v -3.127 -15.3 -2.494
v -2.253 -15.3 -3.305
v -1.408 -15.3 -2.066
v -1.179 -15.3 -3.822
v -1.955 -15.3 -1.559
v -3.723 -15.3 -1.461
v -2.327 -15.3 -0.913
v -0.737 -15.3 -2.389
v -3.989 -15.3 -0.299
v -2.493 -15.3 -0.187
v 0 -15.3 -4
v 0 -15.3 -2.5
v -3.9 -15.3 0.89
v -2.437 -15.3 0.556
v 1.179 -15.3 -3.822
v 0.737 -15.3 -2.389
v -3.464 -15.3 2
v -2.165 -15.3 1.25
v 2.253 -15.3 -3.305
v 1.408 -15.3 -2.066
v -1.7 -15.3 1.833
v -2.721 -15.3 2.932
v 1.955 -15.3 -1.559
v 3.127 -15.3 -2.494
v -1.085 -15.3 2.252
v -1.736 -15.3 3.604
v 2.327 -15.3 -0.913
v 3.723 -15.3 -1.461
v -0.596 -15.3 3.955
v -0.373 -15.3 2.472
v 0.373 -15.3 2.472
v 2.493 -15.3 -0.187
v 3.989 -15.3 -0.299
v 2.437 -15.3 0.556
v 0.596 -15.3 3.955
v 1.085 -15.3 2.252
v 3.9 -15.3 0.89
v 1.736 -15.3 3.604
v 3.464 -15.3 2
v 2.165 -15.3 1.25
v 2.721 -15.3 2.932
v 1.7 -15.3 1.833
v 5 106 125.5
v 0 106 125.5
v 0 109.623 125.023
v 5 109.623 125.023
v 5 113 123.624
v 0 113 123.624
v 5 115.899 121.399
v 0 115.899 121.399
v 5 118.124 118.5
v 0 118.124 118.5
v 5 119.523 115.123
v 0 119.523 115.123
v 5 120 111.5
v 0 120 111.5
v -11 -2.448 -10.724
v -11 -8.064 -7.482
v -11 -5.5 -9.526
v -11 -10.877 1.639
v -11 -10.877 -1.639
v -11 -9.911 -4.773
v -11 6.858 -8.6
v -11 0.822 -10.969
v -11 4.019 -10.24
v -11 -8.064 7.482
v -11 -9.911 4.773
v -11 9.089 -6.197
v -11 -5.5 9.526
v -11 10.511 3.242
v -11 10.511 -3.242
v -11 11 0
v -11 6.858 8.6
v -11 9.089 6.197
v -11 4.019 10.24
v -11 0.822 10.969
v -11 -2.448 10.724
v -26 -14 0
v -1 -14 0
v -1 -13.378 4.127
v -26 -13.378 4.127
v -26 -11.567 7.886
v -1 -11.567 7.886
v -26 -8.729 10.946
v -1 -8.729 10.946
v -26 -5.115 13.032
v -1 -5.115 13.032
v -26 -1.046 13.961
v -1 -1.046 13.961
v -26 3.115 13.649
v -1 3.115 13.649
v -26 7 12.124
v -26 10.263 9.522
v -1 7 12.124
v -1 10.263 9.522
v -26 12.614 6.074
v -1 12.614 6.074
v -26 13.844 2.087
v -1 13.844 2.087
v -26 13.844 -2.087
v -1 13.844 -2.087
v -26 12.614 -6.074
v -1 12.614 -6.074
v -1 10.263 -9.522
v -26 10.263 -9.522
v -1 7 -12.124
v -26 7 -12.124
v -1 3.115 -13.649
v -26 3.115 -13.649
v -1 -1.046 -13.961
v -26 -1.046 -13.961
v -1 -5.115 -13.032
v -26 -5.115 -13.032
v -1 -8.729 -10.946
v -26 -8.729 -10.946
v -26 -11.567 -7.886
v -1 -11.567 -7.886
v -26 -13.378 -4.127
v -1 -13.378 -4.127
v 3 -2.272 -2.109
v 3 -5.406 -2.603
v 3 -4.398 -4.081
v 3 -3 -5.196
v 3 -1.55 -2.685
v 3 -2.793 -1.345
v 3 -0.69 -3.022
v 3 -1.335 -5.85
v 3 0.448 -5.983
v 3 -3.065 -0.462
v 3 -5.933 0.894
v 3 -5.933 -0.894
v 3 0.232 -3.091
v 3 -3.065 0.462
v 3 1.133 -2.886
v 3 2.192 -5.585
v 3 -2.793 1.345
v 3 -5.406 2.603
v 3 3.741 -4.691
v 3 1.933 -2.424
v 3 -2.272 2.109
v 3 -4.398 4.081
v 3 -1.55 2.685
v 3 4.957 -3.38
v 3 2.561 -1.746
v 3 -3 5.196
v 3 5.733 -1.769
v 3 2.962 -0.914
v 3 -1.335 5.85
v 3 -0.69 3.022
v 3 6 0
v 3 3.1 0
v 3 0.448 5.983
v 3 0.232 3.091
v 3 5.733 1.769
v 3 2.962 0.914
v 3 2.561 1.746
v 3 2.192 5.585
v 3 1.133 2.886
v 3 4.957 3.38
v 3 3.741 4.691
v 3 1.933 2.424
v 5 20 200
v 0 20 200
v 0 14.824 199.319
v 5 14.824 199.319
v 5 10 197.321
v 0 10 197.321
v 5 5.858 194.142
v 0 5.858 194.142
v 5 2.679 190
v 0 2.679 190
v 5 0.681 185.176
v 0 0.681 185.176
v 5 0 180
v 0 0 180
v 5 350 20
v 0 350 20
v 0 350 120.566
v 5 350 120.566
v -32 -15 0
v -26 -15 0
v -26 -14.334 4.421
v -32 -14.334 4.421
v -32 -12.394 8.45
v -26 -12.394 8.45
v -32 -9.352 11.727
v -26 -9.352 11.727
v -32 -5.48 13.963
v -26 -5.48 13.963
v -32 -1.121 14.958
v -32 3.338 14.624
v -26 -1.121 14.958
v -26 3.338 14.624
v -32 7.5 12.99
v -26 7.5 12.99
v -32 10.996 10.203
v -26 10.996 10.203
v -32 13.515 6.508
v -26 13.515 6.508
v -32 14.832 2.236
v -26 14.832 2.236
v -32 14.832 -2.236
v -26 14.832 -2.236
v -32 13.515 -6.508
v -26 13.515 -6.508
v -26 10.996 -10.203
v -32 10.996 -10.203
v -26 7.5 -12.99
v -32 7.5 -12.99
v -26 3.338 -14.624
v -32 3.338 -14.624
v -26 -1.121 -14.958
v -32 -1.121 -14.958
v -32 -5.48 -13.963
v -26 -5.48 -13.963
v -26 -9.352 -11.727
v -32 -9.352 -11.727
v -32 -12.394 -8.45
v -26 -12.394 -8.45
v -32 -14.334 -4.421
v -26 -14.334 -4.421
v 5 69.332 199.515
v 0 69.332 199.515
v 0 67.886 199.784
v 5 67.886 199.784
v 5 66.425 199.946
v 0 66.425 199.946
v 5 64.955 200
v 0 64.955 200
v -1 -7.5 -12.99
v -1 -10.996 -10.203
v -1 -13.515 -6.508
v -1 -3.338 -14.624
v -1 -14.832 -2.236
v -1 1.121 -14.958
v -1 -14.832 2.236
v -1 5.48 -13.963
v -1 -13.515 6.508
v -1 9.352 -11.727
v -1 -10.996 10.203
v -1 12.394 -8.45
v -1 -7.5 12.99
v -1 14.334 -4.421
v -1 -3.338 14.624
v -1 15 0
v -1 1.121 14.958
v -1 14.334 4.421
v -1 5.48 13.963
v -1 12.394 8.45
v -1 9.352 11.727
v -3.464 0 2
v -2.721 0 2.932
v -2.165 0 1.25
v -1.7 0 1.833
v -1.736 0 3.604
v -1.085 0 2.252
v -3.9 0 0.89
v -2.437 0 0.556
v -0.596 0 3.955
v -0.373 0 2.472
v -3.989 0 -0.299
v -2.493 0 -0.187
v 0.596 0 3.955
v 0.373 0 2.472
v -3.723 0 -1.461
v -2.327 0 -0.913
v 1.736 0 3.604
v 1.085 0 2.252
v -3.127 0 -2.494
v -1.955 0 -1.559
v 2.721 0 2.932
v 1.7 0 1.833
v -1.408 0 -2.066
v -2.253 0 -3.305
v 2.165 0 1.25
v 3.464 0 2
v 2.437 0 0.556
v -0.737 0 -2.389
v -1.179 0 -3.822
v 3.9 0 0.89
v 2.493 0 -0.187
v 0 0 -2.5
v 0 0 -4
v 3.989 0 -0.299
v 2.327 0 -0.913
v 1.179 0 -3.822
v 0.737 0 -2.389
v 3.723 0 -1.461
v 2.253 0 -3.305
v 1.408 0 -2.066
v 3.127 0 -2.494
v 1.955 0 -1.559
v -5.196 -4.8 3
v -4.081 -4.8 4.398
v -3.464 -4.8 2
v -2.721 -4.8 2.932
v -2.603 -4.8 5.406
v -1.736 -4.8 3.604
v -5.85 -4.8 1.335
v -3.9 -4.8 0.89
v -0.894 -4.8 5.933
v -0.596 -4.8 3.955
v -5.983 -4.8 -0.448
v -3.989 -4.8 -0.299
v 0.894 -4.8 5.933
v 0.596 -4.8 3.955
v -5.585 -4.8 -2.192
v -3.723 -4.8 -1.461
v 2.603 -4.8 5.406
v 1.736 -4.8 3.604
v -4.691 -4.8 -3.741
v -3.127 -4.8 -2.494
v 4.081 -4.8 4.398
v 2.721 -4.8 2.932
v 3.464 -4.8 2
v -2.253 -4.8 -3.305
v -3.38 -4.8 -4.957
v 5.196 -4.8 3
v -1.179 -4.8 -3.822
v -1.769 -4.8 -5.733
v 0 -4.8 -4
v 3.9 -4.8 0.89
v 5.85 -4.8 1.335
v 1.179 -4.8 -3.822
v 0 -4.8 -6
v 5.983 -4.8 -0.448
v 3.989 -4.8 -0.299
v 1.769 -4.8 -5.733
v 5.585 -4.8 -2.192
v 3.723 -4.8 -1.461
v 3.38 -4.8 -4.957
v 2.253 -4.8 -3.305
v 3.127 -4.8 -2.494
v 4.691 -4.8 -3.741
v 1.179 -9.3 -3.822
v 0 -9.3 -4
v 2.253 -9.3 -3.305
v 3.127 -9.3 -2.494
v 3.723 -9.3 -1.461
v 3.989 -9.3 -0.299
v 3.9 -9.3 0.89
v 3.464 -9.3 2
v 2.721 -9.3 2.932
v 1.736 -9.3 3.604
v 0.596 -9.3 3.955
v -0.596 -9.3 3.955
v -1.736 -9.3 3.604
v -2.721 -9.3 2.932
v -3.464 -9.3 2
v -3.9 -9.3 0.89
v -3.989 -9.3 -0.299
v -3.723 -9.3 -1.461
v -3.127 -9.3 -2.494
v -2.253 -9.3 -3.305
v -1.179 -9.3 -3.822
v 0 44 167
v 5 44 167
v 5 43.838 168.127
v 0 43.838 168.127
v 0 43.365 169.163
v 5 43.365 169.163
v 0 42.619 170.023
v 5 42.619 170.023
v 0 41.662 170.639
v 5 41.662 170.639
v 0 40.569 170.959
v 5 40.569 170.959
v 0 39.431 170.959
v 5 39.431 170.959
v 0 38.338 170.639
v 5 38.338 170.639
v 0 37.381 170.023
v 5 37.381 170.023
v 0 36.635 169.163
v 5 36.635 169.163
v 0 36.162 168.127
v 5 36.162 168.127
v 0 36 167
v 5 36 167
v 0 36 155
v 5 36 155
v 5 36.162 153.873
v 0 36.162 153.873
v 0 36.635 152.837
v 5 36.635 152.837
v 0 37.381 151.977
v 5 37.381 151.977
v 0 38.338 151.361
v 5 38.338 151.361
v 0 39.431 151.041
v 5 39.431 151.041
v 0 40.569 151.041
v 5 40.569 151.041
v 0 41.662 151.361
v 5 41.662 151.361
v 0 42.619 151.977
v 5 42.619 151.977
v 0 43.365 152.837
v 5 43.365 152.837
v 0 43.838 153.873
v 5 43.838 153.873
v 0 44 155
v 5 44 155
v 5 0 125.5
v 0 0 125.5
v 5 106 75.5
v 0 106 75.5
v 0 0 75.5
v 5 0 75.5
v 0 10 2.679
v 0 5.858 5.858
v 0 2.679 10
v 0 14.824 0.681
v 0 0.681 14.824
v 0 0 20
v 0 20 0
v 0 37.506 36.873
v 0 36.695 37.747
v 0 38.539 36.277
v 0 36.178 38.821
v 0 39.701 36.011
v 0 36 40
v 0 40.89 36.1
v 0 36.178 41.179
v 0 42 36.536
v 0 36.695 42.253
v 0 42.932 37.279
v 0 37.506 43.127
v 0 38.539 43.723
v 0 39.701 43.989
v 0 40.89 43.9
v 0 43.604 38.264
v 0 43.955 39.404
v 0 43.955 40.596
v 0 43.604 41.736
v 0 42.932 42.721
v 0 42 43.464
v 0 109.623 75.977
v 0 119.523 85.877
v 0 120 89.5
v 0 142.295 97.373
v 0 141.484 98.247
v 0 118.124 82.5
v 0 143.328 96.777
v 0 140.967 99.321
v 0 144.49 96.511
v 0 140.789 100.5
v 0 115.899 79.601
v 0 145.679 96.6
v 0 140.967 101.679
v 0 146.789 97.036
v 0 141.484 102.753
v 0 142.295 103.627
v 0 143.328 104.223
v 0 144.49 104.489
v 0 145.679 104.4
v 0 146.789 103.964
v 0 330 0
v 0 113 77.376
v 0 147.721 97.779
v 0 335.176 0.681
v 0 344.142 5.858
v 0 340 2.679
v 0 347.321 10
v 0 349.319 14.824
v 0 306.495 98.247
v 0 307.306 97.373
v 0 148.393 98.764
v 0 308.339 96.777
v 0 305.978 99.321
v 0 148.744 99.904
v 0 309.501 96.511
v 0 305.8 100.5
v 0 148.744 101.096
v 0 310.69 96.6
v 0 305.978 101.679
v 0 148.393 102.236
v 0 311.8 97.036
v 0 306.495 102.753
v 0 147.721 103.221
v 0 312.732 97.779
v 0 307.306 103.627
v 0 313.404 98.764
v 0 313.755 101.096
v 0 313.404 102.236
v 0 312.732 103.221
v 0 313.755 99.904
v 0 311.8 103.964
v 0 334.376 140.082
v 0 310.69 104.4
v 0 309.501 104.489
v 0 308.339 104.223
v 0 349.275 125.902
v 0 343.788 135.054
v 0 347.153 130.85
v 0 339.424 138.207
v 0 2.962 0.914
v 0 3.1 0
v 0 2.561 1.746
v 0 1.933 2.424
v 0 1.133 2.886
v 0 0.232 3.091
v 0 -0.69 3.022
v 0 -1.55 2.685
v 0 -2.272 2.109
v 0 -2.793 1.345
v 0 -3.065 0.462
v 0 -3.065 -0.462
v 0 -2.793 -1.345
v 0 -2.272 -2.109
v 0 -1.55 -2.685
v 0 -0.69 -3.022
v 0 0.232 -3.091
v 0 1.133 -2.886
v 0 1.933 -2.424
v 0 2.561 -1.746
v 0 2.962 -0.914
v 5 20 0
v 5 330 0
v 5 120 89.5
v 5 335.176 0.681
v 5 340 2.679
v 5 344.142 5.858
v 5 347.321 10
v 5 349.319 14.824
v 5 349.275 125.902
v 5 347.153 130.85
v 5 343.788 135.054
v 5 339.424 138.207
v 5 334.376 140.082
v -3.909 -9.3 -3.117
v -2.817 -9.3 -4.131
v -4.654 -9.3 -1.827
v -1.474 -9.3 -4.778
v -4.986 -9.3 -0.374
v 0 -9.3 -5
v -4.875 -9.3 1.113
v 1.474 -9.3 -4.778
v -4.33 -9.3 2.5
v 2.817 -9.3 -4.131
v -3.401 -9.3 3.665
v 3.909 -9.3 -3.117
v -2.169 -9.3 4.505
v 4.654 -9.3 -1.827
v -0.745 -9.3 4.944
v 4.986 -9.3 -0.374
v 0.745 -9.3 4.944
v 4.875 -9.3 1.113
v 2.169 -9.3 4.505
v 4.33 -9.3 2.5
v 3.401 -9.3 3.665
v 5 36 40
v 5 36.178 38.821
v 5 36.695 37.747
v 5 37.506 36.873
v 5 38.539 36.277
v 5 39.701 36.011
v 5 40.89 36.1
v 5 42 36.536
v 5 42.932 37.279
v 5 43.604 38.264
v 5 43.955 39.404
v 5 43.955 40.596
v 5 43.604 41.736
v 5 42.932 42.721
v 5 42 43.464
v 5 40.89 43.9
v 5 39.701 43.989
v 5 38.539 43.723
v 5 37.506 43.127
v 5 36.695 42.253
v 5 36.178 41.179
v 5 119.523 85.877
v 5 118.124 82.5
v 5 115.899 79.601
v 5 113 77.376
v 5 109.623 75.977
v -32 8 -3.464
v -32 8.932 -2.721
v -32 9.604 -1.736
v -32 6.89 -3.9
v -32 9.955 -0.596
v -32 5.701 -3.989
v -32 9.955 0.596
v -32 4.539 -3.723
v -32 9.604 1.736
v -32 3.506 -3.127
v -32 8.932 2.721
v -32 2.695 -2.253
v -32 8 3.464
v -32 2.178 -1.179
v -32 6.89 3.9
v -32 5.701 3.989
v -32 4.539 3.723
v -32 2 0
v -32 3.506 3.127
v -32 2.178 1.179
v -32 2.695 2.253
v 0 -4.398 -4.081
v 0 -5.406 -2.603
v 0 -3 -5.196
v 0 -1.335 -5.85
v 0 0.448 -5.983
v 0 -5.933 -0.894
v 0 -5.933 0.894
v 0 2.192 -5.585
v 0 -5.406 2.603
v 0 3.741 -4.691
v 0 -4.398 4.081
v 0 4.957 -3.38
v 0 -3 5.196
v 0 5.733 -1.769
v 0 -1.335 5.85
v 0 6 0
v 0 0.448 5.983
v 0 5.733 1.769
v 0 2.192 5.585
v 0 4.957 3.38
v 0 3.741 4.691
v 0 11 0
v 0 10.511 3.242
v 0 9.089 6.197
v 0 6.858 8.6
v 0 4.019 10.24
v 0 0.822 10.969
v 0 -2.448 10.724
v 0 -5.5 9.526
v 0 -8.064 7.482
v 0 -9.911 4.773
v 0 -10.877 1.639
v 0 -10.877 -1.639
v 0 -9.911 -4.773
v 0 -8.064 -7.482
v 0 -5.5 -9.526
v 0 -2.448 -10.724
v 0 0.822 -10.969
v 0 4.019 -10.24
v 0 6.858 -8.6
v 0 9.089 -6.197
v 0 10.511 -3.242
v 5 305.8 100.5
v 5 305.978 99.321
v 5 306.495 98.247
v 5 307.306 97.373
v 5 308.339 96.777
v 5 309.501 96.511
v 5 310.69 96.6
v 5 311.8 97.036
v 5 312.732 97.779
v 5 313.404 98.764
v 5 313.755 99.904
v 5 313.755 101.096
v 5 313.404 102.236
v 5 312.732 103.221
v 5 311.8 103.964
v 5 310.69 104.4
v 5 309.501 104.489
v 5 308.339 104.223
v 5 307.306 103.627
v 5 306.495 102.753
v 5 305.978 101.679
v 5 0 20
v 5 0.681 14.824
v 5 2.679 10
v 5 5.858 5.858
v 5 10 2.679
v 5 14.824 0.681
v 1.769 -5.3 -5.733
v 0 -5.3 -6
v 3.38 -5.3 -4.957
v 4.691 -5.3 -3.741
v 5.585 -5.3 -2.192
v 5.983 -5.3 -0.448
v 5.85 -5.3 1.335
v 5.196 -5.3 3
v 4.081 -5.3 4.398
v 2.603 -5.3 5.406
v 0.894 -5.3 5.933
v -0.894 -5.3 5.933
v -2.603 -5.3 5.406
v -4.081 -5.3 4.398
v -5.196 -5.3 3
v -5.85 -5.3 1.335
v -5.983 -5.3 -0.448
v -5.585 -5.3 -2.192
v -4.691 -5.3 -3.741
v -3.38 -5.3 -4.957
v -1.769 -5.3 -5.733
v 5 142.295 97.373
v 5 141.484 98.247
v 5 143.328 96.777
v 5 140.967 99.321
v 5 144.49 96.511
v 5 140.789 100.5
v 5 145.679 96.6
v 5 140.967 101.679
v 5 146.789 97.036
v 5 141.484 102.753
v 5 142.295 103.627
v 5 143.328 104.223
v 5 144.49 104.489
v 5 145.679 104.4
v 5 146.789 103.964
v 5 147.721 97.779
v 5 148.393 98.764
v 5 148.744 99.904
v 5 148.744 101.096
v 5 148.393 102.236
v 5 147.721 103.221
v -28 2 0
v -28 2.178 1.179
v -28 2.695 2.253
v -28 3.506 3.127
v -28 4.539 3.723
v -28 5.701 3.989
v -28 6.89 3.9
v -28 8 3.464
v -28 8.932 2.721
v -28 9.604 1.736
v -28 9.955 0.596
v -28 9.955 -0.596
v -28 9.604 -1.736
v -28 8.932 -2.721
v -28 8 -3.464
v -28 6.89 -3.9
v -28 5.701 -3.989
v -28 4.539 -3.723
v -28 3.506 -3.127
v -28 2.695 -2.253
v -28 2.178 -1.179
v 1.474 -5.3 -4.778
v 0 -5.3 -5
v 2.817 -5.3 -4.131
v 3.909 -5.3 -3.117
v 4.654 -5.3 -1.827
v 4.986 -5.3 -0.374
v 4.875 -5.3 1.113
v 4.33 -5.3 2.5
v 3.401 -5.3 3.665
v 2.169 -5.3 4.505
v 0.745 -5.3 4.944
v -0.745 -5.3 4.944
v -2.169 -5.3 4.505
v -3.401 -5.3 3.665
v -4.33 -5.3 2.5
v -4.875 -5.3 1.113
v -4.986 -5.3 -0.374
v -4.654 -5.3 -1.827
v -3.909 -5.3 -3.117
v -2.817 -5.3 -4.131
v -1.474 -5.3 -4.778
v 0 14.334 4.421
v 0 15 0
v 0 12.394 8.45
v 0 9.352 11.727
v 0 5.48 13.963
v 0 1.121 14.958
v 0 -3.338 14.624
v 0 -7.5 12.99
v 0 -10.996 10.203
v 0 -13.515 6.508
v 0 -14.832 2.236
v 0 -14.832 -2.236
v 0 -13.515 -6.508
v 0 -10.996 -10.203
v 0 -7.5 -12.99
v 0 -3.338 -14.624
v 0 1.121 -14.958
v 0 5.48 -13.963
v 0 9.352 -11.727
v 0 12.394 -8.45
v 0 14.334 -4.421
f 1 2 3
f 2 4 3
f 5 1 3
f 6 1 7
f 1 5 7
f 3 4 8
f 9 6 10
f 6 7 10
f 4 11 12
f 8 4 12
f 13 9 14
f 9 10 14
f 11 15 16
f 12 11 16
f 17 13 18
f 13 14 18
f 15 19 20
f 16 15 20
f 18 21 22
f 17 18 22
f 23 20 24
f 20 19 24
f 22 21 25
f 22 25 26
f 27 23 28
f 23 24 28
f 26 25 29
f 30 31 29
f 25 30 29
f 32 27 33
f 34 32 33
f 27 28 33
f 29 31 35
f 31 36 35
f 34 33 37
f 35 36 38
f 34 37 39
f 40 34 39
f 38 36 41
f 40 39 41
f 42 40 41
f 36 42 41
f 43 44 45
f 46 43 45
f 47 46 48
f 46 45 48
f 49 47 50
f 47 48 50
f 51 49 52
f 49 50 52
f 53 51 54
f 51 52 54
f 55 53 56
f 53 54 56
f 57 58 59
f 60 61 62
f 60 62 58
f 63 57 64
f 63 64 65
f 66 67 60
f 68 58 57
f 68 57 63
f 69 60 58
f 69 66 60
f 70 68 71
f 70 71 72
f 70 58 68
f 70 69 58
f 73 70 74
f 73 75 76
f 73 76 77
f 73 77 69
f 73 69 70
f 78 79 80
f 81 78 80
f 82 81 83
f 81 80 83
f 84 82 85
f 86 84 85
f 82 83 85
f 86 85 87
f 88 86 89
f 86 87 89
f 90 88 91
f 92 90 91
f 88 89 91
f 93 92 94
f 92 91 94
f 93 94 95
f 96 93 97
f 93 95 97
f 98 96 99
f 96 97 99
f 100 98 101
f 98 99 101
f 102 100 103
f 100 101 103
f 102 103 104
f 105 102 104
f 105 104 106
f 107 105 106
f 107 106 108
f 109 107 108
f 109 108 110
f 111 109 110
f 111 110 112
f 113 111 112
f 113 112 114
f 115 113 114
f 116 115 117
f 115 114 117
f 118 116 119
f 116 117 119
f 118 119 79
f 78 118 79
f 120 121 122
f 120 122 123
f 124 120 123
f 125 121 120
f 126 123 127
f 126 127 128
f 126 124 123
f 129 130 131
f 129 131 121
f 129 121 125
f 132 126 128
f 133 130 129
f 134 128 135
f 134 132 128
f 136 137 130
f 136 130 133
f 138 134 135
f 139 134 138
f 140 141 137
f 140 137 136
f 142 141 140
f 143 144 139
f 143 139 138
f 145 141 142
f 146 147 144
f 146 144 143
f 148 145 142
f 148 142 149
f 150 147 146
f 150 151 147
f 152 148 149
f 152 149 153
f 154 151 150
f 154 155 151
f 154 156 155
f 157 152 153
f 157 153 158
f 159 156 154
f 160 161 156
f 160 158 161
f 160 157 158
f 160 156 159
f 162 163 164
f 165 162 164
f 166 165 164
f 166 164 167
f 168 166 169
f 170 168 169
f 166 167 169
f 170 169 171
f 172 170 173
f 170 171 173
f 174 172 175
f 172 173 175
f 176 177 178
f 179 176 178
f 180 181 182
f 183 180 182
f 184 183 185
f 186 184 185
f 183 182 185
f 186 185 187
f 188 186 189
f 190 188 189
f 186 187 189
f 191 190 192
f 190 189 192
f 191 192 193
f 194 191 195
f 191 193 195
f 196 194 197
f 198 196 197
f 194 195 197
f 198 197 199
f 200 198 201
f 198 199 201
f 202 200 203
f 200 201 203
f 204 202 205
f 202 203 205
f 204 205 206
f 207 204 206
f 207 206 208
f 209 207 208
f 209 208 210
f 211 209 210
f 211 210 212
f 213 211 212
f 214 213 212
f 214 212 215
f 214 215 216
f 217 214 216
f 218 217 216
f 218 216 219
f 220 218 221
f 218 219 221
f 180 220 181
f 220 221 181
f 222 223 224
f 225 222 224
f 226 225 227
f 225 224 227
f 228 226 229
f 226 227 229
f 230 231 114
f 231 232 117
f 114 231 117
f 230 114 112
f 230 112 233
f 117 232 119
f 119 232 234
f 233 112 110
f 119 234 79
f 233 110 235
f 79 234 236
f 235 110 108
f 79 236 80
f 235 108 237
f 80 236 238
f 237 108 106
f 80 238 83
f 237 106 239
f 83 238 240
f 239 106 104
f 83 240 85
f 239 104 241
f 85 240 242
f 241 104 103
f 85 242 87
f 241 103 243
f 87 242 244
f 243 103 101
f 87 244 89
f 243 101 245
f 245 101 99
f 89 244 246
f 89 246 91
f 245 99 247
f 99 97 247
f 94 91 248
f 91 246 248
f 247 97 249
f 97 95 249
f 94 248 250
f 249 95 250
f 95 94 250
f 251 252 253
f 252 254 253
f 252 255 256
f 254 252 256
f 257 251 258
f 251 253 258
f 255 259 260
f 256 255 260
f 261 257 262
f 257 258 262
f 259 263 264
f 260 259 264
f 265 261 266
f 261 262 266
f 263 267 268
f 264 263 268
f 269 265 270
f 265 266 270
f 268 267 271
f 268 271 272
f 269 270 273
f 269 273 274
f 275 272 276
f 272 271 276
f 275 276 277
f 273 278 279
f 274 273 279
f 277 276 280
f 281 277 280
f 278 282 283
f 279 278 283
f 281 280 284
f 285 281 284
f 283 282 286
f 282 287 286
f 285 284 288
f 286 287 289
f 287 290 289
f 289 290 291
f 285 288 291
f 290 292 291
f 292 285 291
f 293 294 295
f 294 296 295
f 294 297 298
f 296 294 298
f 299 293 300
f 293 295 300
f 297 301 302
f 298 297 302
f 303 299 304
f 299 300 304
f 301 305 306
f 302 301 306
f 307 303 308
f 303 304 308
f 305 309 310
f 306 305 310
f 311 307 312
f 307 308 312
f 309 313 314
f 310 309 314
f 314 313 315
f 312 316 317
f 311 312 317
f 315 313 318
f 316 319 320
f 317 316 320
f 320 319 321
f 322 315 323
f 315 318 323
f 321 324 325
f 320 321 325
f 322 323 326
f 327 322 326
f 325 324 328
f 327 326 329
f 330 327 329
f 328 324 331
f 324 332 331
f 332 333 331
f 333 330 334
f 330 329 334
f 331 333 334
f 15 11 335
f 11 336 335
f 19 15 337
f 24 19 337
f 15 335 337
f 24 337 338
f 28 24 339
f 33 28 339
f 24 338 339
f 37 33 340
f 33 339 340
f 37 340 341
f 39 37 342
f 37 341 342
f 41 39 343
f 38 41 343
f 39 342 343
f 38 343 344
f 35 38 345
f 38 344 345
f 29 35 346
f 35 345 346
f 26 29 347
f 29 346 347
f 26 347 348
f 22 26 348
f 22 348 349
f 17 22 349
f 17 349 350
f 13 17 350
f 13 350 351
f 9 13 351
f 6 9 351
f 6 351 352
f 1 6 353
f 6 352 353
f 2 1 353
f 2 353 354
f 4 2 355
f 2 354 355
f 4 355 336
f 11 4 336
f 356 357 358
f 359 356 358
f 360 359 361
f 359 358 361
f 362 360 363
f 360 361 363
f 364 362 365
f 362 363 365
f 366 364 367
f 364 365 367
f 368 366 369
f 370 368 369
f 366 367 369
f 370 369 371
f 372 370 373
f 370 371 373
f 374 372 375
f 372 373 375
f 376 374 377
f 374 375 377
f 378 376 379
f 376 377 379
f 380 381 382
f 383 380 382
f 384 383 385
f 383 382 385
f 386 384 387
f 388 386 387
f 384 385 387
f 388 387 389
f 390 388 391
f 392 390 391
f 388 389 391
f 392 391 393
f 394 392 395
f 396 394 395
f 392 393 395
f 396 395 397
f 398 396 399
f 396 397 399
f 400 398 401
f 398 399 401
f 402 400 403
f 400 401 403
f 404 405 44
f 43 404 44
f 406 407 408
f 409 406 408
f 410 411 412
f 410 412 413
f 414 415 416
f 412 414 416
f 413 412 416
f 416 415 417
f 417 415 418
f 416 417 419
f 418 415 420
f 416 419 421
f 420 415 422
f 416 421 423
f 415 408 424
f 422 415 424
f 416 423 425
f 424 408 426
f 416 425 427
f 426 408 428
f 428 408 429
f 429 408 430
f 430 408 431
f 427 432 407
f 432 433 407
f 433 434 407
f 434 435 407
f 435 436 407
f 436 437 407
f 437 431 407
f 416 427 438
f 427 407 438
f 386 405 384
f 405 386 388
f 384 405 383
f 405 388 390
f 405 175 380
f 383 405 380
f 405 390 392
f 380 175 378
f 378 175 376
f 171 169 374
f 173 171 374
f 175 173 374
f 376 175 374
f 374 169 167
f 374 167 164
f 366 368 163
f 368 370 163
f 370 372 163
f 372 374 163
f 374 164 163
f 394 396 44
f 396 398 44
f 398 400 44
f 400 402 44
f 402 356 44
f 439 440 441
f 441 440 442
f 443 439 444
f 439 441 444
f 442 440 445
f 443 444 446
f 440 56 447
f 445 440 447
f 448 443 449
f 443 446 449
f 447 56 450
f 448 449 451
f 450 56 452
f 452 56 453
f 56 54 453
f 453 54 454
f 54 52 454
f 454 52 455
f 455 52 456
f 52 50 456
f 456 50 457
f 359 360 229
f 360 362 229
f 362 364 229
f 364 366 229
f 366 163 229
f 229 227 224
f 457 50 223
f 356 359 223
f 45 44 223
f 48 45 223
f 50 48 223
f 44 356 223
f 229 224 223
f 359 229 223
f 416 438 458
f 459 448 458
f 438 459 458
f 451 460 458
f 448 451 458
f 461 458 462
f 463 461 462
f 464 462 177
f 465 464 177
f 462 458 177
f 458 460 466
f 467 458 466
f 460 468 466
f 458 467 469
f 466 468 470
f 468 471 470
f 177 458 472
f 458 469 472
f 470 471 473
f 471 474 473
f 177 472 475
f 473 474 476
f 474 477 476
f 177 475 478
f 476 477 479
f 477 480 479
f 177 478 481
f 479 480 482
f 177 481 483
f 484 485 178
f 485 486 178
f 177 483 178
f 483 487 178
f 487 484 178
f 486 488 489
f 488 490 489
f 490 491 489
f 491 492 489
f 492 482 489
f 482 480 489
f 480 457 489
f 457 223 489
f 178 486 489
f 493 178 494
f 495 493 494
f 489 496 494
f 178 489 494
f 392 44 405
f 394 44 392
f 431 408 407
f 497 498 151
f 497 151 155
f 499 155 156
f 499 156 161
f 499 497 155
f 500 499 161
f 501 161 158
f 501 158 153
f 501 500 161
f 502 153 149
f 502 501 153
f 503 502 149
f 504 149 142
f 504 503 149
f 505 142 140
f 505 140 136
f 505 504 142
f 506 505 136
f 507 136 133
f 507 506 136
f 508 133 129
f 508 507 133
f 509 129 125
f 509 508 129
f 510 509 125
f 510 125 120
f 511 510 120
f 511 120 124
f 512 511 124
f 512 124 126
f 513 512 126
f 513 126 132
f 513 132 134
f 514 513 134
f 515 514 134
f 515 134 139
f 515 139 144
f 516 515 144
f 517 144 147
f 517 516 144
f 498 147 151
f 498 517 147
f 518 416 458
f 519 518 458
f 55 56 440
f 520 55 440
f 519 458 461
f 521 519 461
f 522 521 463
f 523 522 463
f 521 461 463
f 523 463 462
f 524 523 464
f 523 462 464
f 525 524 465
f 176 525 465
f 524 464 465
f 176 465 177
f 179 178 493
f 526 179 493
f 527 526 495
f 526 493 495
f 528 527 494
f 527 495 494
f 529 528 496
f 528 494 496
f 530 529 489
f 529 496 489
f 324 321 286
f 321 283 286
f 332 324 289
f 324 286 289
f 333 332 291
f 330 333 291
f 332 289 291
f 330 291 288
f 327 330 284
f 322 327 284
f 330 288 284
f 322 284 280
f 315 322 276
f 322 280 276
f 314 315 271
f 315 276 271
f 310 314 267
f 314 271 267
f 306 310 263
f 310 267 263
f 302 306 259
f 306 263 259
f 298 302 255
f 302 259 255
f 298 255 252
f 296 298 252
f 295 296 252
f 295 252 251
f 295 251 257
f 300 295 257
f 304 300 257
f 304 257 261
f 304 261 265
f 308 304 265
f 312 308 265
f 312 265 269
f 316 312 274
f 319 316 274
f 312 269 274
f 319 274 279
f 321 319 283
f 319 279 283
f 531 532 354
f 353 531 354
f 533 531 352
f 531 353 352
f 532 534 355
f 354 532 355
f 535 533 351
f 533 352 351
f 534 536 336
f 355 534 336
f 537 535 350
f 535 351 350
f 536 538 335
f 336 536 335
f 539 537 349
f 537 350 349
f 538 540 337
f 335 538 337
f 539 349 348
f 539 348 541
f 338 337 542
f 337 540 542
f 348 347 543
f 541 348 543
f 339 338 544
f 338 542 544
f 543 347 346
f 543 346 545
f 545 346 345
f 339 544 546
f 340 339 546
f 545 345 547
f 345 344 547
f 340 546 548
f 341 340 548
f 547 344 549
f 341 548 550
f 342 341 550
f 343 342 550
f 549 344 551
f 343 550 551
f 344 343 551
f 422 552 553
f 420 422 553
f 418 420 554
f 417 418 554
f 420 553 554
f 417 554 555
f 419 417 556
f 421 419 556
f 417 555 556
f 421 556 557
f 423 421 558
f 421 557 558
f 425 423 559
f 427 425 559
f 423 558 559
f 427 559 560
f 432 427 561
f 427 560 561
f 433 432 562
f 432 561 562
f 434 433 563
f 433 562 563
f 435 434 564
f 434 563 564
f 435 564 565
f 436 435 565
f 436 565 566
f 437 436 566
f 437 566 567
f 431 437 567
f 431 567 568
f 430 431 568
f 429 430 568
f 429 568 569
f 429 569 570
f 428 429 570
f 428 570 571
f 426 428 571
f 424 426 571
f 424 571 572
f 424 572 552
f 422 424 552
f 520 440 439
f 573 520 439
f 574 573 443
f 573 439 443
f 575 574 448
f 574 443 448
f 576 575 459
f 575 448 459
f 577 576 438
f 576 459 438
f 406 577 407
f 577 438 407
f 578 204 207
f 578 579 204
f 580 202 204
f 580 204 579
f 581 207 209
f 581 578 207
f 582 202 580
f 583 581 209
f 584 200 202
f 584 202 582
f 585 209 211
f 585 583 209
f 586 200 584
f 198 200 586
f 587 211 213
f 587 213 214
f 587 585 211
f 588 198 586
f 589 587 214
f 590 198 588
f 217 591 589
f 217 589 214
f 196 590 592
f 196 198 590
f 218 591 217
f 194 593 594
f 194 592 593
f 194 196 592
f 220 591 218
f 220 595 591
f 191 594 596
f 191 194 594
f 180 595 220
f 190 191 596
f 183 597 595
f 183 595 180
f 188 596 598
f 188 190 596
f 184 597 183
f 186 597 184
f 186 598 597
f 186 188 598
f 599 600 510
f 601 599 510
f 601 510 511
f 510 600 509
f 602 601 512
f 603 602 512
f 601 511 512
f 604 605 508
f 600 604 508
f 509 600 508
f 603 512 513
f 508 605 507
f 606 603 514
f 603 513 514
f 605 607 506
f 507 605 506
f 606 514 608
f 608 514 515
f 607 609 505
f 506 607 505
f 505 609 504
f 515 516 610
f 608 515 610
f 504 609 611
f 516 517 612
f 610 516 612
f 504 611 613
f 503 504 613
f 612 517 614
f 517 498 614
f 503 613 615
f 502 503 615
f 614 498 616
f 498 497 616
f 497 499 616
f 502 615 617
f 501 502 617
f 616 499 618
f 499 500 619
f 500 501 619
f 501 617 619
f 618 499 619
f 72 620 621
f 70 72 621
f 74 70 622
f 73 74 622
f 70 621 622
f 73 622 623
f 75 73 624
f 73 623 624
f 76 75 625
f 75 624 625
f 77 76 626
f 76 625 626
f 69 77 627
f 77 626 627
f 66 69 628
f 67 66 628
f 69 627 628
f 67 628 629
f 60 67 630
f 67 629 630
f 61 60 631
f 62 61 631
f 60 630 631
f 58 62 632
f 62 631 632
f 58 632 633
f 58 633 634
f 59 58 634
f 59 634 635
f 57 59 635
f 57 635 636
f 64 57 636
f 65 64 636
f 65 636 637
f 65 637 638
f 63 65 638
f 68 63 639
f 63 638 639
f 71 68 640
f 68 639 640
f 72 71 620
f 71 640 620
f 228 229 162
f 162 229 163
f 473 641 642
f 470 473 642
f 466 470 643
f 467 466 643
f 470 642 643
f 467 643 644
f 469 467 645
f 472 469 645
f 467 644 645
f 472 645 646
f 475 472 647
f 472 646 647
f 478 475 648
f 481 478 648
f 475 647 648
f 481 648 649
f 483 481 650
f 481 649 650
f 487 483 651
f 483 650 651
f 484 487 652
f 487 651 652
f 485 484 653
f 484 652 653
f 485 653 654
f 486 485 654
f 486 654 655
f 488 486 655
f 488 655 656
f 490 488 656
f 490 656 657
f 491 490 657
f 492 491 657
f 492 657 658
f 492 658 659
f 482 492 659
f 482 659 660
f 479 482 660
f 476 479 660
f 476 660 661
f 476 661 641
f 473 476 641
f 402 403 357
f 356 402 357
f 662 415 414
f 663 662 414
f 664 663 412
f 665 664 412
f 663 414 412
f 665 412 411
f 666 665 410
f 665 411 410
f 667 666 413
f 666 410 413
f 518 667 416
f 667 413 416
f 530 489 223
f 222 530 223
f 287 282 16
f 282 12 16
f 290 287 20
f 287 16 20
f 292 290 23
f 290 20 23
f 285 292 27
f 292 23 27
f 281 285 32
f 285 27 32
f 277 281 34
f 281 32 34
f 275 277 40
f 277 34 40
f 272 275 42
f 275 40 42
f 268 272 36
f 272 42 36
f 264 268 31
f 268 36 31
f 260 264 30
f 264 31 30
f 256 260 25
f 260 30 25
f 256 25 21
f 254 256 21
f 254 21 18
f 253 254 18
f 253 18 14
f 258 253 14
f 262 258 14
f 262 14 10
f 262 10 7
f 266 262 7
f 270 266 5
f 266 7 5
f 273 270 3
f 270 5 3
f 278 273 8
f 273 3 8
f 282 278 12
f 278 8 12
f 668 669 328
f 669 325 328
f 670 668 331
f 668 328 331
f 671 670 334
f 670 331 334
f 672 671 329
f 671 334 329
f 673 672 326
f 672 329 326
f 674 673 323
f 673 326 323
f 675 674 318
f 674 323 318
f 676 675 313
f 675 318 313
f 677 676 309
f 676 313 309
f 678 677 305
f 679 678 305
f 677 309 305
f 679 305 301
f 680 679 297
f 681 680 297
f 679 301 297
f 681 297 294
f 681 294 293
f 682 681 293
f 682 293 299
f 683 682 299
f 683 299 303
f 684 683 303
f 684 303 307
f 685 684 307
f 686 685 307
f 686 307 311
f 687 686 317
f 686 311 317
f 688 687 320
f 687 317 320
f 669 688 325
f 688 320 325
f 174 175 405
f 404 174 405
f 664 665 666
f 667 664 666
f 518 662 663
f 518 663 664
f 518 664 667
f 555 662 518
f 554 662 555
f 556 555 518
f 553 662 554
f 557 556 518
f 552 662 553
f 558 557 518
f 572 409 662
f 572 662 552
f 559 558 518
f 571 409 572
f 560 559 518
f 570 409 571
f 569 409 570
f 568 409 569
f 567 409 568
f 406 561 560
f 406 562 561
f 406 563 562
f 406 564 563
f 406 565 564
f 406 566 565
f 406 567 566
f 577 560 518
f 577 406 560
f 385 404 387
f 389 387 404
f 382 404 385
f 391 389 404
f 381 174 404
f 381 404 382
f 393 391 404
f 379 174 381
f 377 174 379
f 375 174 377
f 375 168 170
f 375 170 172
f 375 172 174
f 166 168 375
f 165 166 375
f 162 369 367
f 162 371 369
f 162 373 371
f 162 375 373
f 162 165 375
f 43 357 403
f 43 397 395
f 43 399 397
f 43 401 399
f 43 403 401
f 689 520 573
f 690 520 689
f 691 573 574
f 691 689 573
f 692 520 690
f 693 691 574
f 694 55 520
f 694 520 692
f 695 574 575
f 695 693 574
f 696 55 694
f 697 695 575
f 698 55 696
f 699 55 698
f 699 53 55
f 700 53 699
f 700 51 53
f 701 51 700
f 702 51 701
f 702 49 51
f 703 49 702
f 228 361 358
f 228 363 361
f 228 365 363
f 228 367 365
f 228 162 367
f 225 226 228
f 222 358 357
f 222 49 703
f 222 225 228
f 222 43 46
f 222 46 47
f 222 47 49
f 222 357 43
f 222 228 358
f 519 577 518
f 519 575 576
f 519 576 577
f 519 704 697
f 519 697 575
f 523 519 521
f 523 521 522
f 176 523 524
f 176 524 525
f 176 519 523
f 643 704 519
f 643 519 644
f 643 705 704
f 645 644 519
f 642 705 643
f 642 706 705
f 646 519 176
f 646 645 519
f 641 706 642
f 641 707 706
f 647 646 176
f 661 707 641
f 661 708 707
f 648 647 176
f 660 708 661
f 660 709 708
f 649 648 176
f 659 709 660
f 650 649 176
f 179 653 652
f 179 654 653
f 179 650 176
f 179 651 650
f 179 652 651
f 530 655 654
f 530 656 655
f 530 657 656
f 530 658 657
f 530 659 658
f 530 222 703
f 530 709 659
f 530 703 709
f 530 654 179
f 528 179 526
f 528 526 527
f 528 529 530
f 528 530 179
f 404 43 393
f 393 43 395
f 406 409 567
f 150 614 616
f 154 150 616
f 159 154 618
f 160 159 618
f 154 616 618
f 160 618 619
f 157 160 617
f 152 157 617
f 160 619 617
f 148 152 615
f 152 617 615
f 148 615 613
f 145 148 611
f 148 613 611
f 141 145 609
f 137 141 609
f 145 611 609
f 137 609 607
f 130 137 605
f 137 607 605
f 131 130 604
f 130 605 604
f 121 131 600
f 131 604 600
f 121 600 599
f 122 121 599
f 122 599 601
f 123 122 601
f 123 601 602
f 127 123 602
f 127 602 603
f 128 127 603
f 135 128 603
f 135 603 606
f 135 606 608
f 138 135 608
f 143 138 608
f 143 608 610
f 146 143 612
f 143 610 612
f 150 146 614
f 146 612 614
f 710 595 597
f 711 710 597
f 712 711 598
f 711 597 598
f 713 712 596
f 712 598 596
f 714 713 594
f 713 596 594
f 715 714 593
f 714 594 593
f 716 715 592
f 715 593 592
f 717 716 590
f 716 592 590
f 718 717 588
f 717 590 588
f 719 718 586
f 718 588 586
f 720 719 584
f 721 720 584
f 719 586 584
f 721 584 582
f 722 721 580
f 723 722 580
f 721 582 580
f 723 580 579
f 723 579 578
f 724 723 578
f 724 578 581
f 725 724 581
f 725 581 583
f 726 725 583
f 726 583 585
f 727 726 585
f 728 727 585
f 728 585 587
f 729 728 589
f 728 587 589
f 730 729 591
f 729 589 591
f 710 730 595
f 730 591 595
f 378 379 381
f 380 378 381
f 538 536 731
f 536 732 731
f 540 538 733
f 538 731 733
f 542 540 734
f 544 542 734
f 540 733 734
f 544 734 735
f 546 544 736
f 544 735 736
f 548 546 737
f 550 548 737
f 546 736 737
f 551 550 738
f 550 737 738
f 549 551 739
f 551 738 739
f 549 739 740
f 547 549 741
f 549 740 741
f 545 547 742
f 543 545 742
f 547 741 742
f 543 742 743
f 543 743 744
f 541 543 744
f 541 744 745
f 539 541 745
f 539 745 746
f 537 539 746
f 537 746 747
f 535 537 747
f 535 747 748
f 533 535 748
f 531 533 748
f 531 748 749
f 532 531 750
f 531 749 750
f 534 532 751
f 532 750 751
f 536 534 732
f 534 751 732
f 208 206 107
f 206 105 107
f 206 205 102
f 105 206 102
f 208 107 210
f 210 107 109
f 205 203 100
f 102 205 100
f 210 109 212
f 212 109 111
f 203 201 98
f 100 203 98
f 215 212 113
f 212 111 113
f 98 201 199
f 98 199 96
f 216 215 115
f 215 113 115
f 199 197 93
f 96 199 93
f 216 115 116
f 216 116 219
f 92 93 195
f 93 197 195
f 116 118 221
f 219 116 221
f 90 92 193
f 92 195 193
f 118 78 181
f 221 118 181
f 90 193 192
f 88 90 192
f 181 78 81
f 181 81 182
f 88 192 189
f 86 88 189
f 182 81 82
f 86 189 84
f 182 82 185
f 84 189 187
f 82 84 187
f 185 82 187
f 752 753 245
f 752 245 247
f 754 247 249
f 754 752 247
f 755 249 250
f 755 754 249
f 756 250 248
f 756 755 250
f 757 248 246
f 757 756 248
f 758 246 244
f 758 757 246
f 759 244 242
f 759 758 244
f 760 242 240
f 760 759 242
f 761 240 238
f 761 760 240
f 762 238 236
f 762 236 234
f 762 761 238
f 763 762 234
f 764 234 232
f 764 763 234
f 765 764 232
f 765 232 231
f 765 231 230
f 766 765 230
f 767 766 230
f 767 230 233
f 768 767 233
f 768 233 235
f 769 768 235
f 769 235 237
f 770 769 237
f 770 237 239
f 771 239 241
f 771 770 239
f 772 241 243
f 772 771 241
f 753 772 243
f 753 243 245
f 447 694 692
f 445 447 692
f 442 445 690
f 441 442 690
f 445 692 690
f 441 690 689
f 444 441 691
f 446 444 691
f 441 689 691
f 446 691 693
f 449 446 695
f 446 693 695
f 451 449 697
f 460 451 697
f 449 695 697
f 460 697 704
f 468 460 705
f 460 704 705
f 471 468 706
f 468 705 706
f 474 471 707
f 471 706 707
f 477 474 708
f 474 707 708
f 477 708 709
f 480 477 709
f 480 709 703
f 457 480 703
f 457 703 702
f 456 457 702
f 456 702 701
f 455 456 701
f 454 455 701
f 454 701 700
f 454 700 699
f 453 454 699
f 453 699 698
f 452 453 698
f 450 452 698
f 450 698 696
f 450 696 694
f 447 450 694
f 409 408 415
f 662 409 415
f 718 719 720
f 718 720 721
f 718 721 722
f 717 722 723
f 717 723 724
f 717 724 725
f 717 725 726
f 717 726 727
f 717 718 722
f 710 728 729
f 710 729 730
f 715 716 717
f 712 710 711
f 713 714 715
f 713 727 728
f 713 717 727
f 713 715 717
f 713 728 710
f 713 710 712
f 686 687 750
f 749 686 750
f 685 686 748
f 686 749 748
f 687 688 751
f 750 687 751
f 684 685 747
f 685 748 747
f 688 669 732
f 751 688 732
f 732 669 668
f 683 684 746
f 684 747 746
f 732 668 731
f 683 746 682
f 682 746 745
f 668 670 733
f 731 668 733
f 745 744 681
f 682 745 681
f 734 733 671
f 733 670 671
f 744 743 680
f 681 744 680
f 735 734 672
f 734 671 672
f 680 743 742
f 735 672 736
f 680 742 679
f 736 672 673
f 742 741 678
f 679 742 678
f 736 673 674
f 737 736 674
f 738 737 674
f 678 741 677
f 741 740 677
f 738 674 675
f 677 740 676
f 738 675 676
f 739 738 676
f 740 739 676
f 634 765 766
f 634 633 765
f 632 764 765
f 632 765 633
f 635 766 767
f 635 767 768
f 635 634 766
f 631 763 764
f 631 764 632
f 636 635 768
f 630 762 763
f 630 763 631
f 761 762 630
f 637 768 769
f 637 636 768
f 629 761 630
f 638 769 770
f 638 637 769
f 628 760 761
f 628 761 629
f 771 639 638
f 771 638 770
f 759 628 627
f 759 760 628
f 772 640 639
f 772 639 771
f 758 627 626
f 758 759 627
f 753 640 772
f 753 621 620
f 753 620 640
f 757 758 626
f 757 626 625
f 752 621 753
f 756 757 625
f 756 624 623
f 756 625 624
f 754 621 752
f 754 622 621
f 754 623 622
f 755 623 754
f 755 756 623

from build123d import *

# Parameters (mm, degrees)
F1_DEPTH  = 5
F2_D      = 8
F4_DEPTH  = 5.001
F5_R      = 15
F6_DEPTH  = 1
F7_R      = 14
F8_DEPTH  = 25
F9_R      = 15
F9_R_2    = 14
F10_DEPTH = 6
F11_R     = 11
F12_DEPTH = 11
F13_R     = 4
F14_DEPTH = 4
F17_R     = 6
F17_R_2   = 3.1
F18_DEPTH = 3


with BuildPart() as f1:
    # F0 (on Right) → F1 (new body)
    with BuildSketch(Plane.YZ):
        with BuildLine():
            ThreePointArc((0, 20), (5.8578643763, 5.8578643763), (20, 0))
            Line((20, 0), (330, 0))
            ThreePointArc((330, 0), (344.1421356237, 5.8578643763), (350, 20))
            Line((350, 20), (350, 120.5663343317))
            ThreePointArc((350, 120.5663343317), (345.6128569451, 133.065882244), (334.3761301989, 140.081699675))
            Line((334.3761301989, 140.081699675), (69.3315253799, 199.5153653433))
            ThreePointArc((69.3315253799, 199.5153653433), (67.1568371101, 199.8784721101), (64.955395181, 200))
            Line((64.955395181, 200), (20, 200))
            ThreePointArc((20, 200), (5.8578643763, 194.1421356237), (0, 180))
            Line((0, 180), (0, 125.5))
            Line((0, 125.5), (106, 125.5))
            ThreePointArc((106, 125.5), (115.8994949366, 121.3994949366), (120, 111.5))
            Line((120, 111.5), (120, 89.5))
            ThreePointArc((120, 89.5), (115.8994949366, 79.6005050634), (106, 75.5))
            Line((106, 75.5), (0, 75.5))
            Line((0, 75.5), (0, 20))
        make_face()
    extrude(amount=F1_DEPTH)

    # F2 (through all)
    with Locations(Plane(origin=(0, 0, 0), x_dir=(0, 1, 0), z_dir=(-1, 0, 0))):
        with Locations((144.7890738579, -100.5), (309.799925871, -100.5), (40, -161), (40, -40)):
            Hole(F2_D / 2)

    # F3 (on face) → F4 (cut, through all)
    with BuildSketch(Plane.YZ.offset(5)):
        with BuildLine():
            ThreePointArc((36, 161), (40, 165), (44, 161))
            Line((44, 161), (44, 166.999999468))
            ThreePointArc((44, 166.999999468), (40.000000532, 170.999999468), (36, 167.000000532))
            Line((36, 167.000000532), (36, 161))
        make_face()
        with BuildLine():
            ThreePointArc((36, 155.000000532), (39.999999468, 150.999999468), (44, 154.999999468))
            Line((44, 154.999999468), (44, 161))
            ThreePointArc((44, 161), (40, 157), (36, 161))
            Line((36, 161), (36, 155.000000532))
        make_face()
    extrude(amount=-F4_DEPTH, mode=Mode.SUBTRACT)


with BuildPart() as f6:
    # F5 (on Right) → F6 (new body)
    with BuildSketch(Plane.YZ):
        Circle(F5_R)
    extrude(amount=-F6_DEPTH)

    # F7 (on face) → F8 (join)
    with BuildSketch(Plane(origin=(-1, 0, 0), x_dir=(0, -1, 0), z_dir=(-1, 0, 0))):
        Circle(F7_R)
    extrude(amount=F8_DEPTH)

    # F9 (on face) → F10 (join)
    with BuildSketch(Plane(origin=(-26, 0, 0), x_dir=(0, -1, 0), z_dir=(-1, 0, 0))):
        Circle(F9_R)
        Circle(F9_R_2, mode=Mode.SUBTRACT)
        Circle(F9_R_2)
    extrude(amount=F10_DEPTH)

    # F11 (on Right) → F12 (cut)
    with BuildSketch(Plane.YZ):
        Circle(F11_R)
    extrude(amount=-F12_DEPTH, mode=Mode.SUBTRACT)

    # F13 (on face) → F14 (cut)
    with BuildSketch(Plane(origin=(-32, 0, 0), x_dir=(0, -1, 0), z_dir=(-1, 0, 0))):
        with Locations((-6, 0)):
            Circle(F13_R)
    extrude(amount=-F14_DEPTH, mode=Mode.SUBTRACT)


with BuildPart() as f16:
    # F15 (on Right) → F16 (revolve)
    with BuildSketch(Plane.YZ):
        Polygon((0, -4), (0, -2.5), (-15.3, -2.5), (-15.3, -4), (-9.3, -4), (-9.3, -5), (-5.3, -5), (-5.3, -6), (-4.8, -6), (-4.8, -4), align=None)
    revolve(axis=Axis((0, -7.65, 0), (0, -1, 0)))


with BuildPart() as f18:
    # F17 (on Right) → F18 (new body)
    with BuildSketch(Plane.YZ):
        Circle(F17_R)
        Circle(F17_R_2, mode=Mode.SUBTRACT)
    extrude(amount=F18_DEPTH)


solid = Compound([f1.part, f6.part, f16.part, f18.part])
